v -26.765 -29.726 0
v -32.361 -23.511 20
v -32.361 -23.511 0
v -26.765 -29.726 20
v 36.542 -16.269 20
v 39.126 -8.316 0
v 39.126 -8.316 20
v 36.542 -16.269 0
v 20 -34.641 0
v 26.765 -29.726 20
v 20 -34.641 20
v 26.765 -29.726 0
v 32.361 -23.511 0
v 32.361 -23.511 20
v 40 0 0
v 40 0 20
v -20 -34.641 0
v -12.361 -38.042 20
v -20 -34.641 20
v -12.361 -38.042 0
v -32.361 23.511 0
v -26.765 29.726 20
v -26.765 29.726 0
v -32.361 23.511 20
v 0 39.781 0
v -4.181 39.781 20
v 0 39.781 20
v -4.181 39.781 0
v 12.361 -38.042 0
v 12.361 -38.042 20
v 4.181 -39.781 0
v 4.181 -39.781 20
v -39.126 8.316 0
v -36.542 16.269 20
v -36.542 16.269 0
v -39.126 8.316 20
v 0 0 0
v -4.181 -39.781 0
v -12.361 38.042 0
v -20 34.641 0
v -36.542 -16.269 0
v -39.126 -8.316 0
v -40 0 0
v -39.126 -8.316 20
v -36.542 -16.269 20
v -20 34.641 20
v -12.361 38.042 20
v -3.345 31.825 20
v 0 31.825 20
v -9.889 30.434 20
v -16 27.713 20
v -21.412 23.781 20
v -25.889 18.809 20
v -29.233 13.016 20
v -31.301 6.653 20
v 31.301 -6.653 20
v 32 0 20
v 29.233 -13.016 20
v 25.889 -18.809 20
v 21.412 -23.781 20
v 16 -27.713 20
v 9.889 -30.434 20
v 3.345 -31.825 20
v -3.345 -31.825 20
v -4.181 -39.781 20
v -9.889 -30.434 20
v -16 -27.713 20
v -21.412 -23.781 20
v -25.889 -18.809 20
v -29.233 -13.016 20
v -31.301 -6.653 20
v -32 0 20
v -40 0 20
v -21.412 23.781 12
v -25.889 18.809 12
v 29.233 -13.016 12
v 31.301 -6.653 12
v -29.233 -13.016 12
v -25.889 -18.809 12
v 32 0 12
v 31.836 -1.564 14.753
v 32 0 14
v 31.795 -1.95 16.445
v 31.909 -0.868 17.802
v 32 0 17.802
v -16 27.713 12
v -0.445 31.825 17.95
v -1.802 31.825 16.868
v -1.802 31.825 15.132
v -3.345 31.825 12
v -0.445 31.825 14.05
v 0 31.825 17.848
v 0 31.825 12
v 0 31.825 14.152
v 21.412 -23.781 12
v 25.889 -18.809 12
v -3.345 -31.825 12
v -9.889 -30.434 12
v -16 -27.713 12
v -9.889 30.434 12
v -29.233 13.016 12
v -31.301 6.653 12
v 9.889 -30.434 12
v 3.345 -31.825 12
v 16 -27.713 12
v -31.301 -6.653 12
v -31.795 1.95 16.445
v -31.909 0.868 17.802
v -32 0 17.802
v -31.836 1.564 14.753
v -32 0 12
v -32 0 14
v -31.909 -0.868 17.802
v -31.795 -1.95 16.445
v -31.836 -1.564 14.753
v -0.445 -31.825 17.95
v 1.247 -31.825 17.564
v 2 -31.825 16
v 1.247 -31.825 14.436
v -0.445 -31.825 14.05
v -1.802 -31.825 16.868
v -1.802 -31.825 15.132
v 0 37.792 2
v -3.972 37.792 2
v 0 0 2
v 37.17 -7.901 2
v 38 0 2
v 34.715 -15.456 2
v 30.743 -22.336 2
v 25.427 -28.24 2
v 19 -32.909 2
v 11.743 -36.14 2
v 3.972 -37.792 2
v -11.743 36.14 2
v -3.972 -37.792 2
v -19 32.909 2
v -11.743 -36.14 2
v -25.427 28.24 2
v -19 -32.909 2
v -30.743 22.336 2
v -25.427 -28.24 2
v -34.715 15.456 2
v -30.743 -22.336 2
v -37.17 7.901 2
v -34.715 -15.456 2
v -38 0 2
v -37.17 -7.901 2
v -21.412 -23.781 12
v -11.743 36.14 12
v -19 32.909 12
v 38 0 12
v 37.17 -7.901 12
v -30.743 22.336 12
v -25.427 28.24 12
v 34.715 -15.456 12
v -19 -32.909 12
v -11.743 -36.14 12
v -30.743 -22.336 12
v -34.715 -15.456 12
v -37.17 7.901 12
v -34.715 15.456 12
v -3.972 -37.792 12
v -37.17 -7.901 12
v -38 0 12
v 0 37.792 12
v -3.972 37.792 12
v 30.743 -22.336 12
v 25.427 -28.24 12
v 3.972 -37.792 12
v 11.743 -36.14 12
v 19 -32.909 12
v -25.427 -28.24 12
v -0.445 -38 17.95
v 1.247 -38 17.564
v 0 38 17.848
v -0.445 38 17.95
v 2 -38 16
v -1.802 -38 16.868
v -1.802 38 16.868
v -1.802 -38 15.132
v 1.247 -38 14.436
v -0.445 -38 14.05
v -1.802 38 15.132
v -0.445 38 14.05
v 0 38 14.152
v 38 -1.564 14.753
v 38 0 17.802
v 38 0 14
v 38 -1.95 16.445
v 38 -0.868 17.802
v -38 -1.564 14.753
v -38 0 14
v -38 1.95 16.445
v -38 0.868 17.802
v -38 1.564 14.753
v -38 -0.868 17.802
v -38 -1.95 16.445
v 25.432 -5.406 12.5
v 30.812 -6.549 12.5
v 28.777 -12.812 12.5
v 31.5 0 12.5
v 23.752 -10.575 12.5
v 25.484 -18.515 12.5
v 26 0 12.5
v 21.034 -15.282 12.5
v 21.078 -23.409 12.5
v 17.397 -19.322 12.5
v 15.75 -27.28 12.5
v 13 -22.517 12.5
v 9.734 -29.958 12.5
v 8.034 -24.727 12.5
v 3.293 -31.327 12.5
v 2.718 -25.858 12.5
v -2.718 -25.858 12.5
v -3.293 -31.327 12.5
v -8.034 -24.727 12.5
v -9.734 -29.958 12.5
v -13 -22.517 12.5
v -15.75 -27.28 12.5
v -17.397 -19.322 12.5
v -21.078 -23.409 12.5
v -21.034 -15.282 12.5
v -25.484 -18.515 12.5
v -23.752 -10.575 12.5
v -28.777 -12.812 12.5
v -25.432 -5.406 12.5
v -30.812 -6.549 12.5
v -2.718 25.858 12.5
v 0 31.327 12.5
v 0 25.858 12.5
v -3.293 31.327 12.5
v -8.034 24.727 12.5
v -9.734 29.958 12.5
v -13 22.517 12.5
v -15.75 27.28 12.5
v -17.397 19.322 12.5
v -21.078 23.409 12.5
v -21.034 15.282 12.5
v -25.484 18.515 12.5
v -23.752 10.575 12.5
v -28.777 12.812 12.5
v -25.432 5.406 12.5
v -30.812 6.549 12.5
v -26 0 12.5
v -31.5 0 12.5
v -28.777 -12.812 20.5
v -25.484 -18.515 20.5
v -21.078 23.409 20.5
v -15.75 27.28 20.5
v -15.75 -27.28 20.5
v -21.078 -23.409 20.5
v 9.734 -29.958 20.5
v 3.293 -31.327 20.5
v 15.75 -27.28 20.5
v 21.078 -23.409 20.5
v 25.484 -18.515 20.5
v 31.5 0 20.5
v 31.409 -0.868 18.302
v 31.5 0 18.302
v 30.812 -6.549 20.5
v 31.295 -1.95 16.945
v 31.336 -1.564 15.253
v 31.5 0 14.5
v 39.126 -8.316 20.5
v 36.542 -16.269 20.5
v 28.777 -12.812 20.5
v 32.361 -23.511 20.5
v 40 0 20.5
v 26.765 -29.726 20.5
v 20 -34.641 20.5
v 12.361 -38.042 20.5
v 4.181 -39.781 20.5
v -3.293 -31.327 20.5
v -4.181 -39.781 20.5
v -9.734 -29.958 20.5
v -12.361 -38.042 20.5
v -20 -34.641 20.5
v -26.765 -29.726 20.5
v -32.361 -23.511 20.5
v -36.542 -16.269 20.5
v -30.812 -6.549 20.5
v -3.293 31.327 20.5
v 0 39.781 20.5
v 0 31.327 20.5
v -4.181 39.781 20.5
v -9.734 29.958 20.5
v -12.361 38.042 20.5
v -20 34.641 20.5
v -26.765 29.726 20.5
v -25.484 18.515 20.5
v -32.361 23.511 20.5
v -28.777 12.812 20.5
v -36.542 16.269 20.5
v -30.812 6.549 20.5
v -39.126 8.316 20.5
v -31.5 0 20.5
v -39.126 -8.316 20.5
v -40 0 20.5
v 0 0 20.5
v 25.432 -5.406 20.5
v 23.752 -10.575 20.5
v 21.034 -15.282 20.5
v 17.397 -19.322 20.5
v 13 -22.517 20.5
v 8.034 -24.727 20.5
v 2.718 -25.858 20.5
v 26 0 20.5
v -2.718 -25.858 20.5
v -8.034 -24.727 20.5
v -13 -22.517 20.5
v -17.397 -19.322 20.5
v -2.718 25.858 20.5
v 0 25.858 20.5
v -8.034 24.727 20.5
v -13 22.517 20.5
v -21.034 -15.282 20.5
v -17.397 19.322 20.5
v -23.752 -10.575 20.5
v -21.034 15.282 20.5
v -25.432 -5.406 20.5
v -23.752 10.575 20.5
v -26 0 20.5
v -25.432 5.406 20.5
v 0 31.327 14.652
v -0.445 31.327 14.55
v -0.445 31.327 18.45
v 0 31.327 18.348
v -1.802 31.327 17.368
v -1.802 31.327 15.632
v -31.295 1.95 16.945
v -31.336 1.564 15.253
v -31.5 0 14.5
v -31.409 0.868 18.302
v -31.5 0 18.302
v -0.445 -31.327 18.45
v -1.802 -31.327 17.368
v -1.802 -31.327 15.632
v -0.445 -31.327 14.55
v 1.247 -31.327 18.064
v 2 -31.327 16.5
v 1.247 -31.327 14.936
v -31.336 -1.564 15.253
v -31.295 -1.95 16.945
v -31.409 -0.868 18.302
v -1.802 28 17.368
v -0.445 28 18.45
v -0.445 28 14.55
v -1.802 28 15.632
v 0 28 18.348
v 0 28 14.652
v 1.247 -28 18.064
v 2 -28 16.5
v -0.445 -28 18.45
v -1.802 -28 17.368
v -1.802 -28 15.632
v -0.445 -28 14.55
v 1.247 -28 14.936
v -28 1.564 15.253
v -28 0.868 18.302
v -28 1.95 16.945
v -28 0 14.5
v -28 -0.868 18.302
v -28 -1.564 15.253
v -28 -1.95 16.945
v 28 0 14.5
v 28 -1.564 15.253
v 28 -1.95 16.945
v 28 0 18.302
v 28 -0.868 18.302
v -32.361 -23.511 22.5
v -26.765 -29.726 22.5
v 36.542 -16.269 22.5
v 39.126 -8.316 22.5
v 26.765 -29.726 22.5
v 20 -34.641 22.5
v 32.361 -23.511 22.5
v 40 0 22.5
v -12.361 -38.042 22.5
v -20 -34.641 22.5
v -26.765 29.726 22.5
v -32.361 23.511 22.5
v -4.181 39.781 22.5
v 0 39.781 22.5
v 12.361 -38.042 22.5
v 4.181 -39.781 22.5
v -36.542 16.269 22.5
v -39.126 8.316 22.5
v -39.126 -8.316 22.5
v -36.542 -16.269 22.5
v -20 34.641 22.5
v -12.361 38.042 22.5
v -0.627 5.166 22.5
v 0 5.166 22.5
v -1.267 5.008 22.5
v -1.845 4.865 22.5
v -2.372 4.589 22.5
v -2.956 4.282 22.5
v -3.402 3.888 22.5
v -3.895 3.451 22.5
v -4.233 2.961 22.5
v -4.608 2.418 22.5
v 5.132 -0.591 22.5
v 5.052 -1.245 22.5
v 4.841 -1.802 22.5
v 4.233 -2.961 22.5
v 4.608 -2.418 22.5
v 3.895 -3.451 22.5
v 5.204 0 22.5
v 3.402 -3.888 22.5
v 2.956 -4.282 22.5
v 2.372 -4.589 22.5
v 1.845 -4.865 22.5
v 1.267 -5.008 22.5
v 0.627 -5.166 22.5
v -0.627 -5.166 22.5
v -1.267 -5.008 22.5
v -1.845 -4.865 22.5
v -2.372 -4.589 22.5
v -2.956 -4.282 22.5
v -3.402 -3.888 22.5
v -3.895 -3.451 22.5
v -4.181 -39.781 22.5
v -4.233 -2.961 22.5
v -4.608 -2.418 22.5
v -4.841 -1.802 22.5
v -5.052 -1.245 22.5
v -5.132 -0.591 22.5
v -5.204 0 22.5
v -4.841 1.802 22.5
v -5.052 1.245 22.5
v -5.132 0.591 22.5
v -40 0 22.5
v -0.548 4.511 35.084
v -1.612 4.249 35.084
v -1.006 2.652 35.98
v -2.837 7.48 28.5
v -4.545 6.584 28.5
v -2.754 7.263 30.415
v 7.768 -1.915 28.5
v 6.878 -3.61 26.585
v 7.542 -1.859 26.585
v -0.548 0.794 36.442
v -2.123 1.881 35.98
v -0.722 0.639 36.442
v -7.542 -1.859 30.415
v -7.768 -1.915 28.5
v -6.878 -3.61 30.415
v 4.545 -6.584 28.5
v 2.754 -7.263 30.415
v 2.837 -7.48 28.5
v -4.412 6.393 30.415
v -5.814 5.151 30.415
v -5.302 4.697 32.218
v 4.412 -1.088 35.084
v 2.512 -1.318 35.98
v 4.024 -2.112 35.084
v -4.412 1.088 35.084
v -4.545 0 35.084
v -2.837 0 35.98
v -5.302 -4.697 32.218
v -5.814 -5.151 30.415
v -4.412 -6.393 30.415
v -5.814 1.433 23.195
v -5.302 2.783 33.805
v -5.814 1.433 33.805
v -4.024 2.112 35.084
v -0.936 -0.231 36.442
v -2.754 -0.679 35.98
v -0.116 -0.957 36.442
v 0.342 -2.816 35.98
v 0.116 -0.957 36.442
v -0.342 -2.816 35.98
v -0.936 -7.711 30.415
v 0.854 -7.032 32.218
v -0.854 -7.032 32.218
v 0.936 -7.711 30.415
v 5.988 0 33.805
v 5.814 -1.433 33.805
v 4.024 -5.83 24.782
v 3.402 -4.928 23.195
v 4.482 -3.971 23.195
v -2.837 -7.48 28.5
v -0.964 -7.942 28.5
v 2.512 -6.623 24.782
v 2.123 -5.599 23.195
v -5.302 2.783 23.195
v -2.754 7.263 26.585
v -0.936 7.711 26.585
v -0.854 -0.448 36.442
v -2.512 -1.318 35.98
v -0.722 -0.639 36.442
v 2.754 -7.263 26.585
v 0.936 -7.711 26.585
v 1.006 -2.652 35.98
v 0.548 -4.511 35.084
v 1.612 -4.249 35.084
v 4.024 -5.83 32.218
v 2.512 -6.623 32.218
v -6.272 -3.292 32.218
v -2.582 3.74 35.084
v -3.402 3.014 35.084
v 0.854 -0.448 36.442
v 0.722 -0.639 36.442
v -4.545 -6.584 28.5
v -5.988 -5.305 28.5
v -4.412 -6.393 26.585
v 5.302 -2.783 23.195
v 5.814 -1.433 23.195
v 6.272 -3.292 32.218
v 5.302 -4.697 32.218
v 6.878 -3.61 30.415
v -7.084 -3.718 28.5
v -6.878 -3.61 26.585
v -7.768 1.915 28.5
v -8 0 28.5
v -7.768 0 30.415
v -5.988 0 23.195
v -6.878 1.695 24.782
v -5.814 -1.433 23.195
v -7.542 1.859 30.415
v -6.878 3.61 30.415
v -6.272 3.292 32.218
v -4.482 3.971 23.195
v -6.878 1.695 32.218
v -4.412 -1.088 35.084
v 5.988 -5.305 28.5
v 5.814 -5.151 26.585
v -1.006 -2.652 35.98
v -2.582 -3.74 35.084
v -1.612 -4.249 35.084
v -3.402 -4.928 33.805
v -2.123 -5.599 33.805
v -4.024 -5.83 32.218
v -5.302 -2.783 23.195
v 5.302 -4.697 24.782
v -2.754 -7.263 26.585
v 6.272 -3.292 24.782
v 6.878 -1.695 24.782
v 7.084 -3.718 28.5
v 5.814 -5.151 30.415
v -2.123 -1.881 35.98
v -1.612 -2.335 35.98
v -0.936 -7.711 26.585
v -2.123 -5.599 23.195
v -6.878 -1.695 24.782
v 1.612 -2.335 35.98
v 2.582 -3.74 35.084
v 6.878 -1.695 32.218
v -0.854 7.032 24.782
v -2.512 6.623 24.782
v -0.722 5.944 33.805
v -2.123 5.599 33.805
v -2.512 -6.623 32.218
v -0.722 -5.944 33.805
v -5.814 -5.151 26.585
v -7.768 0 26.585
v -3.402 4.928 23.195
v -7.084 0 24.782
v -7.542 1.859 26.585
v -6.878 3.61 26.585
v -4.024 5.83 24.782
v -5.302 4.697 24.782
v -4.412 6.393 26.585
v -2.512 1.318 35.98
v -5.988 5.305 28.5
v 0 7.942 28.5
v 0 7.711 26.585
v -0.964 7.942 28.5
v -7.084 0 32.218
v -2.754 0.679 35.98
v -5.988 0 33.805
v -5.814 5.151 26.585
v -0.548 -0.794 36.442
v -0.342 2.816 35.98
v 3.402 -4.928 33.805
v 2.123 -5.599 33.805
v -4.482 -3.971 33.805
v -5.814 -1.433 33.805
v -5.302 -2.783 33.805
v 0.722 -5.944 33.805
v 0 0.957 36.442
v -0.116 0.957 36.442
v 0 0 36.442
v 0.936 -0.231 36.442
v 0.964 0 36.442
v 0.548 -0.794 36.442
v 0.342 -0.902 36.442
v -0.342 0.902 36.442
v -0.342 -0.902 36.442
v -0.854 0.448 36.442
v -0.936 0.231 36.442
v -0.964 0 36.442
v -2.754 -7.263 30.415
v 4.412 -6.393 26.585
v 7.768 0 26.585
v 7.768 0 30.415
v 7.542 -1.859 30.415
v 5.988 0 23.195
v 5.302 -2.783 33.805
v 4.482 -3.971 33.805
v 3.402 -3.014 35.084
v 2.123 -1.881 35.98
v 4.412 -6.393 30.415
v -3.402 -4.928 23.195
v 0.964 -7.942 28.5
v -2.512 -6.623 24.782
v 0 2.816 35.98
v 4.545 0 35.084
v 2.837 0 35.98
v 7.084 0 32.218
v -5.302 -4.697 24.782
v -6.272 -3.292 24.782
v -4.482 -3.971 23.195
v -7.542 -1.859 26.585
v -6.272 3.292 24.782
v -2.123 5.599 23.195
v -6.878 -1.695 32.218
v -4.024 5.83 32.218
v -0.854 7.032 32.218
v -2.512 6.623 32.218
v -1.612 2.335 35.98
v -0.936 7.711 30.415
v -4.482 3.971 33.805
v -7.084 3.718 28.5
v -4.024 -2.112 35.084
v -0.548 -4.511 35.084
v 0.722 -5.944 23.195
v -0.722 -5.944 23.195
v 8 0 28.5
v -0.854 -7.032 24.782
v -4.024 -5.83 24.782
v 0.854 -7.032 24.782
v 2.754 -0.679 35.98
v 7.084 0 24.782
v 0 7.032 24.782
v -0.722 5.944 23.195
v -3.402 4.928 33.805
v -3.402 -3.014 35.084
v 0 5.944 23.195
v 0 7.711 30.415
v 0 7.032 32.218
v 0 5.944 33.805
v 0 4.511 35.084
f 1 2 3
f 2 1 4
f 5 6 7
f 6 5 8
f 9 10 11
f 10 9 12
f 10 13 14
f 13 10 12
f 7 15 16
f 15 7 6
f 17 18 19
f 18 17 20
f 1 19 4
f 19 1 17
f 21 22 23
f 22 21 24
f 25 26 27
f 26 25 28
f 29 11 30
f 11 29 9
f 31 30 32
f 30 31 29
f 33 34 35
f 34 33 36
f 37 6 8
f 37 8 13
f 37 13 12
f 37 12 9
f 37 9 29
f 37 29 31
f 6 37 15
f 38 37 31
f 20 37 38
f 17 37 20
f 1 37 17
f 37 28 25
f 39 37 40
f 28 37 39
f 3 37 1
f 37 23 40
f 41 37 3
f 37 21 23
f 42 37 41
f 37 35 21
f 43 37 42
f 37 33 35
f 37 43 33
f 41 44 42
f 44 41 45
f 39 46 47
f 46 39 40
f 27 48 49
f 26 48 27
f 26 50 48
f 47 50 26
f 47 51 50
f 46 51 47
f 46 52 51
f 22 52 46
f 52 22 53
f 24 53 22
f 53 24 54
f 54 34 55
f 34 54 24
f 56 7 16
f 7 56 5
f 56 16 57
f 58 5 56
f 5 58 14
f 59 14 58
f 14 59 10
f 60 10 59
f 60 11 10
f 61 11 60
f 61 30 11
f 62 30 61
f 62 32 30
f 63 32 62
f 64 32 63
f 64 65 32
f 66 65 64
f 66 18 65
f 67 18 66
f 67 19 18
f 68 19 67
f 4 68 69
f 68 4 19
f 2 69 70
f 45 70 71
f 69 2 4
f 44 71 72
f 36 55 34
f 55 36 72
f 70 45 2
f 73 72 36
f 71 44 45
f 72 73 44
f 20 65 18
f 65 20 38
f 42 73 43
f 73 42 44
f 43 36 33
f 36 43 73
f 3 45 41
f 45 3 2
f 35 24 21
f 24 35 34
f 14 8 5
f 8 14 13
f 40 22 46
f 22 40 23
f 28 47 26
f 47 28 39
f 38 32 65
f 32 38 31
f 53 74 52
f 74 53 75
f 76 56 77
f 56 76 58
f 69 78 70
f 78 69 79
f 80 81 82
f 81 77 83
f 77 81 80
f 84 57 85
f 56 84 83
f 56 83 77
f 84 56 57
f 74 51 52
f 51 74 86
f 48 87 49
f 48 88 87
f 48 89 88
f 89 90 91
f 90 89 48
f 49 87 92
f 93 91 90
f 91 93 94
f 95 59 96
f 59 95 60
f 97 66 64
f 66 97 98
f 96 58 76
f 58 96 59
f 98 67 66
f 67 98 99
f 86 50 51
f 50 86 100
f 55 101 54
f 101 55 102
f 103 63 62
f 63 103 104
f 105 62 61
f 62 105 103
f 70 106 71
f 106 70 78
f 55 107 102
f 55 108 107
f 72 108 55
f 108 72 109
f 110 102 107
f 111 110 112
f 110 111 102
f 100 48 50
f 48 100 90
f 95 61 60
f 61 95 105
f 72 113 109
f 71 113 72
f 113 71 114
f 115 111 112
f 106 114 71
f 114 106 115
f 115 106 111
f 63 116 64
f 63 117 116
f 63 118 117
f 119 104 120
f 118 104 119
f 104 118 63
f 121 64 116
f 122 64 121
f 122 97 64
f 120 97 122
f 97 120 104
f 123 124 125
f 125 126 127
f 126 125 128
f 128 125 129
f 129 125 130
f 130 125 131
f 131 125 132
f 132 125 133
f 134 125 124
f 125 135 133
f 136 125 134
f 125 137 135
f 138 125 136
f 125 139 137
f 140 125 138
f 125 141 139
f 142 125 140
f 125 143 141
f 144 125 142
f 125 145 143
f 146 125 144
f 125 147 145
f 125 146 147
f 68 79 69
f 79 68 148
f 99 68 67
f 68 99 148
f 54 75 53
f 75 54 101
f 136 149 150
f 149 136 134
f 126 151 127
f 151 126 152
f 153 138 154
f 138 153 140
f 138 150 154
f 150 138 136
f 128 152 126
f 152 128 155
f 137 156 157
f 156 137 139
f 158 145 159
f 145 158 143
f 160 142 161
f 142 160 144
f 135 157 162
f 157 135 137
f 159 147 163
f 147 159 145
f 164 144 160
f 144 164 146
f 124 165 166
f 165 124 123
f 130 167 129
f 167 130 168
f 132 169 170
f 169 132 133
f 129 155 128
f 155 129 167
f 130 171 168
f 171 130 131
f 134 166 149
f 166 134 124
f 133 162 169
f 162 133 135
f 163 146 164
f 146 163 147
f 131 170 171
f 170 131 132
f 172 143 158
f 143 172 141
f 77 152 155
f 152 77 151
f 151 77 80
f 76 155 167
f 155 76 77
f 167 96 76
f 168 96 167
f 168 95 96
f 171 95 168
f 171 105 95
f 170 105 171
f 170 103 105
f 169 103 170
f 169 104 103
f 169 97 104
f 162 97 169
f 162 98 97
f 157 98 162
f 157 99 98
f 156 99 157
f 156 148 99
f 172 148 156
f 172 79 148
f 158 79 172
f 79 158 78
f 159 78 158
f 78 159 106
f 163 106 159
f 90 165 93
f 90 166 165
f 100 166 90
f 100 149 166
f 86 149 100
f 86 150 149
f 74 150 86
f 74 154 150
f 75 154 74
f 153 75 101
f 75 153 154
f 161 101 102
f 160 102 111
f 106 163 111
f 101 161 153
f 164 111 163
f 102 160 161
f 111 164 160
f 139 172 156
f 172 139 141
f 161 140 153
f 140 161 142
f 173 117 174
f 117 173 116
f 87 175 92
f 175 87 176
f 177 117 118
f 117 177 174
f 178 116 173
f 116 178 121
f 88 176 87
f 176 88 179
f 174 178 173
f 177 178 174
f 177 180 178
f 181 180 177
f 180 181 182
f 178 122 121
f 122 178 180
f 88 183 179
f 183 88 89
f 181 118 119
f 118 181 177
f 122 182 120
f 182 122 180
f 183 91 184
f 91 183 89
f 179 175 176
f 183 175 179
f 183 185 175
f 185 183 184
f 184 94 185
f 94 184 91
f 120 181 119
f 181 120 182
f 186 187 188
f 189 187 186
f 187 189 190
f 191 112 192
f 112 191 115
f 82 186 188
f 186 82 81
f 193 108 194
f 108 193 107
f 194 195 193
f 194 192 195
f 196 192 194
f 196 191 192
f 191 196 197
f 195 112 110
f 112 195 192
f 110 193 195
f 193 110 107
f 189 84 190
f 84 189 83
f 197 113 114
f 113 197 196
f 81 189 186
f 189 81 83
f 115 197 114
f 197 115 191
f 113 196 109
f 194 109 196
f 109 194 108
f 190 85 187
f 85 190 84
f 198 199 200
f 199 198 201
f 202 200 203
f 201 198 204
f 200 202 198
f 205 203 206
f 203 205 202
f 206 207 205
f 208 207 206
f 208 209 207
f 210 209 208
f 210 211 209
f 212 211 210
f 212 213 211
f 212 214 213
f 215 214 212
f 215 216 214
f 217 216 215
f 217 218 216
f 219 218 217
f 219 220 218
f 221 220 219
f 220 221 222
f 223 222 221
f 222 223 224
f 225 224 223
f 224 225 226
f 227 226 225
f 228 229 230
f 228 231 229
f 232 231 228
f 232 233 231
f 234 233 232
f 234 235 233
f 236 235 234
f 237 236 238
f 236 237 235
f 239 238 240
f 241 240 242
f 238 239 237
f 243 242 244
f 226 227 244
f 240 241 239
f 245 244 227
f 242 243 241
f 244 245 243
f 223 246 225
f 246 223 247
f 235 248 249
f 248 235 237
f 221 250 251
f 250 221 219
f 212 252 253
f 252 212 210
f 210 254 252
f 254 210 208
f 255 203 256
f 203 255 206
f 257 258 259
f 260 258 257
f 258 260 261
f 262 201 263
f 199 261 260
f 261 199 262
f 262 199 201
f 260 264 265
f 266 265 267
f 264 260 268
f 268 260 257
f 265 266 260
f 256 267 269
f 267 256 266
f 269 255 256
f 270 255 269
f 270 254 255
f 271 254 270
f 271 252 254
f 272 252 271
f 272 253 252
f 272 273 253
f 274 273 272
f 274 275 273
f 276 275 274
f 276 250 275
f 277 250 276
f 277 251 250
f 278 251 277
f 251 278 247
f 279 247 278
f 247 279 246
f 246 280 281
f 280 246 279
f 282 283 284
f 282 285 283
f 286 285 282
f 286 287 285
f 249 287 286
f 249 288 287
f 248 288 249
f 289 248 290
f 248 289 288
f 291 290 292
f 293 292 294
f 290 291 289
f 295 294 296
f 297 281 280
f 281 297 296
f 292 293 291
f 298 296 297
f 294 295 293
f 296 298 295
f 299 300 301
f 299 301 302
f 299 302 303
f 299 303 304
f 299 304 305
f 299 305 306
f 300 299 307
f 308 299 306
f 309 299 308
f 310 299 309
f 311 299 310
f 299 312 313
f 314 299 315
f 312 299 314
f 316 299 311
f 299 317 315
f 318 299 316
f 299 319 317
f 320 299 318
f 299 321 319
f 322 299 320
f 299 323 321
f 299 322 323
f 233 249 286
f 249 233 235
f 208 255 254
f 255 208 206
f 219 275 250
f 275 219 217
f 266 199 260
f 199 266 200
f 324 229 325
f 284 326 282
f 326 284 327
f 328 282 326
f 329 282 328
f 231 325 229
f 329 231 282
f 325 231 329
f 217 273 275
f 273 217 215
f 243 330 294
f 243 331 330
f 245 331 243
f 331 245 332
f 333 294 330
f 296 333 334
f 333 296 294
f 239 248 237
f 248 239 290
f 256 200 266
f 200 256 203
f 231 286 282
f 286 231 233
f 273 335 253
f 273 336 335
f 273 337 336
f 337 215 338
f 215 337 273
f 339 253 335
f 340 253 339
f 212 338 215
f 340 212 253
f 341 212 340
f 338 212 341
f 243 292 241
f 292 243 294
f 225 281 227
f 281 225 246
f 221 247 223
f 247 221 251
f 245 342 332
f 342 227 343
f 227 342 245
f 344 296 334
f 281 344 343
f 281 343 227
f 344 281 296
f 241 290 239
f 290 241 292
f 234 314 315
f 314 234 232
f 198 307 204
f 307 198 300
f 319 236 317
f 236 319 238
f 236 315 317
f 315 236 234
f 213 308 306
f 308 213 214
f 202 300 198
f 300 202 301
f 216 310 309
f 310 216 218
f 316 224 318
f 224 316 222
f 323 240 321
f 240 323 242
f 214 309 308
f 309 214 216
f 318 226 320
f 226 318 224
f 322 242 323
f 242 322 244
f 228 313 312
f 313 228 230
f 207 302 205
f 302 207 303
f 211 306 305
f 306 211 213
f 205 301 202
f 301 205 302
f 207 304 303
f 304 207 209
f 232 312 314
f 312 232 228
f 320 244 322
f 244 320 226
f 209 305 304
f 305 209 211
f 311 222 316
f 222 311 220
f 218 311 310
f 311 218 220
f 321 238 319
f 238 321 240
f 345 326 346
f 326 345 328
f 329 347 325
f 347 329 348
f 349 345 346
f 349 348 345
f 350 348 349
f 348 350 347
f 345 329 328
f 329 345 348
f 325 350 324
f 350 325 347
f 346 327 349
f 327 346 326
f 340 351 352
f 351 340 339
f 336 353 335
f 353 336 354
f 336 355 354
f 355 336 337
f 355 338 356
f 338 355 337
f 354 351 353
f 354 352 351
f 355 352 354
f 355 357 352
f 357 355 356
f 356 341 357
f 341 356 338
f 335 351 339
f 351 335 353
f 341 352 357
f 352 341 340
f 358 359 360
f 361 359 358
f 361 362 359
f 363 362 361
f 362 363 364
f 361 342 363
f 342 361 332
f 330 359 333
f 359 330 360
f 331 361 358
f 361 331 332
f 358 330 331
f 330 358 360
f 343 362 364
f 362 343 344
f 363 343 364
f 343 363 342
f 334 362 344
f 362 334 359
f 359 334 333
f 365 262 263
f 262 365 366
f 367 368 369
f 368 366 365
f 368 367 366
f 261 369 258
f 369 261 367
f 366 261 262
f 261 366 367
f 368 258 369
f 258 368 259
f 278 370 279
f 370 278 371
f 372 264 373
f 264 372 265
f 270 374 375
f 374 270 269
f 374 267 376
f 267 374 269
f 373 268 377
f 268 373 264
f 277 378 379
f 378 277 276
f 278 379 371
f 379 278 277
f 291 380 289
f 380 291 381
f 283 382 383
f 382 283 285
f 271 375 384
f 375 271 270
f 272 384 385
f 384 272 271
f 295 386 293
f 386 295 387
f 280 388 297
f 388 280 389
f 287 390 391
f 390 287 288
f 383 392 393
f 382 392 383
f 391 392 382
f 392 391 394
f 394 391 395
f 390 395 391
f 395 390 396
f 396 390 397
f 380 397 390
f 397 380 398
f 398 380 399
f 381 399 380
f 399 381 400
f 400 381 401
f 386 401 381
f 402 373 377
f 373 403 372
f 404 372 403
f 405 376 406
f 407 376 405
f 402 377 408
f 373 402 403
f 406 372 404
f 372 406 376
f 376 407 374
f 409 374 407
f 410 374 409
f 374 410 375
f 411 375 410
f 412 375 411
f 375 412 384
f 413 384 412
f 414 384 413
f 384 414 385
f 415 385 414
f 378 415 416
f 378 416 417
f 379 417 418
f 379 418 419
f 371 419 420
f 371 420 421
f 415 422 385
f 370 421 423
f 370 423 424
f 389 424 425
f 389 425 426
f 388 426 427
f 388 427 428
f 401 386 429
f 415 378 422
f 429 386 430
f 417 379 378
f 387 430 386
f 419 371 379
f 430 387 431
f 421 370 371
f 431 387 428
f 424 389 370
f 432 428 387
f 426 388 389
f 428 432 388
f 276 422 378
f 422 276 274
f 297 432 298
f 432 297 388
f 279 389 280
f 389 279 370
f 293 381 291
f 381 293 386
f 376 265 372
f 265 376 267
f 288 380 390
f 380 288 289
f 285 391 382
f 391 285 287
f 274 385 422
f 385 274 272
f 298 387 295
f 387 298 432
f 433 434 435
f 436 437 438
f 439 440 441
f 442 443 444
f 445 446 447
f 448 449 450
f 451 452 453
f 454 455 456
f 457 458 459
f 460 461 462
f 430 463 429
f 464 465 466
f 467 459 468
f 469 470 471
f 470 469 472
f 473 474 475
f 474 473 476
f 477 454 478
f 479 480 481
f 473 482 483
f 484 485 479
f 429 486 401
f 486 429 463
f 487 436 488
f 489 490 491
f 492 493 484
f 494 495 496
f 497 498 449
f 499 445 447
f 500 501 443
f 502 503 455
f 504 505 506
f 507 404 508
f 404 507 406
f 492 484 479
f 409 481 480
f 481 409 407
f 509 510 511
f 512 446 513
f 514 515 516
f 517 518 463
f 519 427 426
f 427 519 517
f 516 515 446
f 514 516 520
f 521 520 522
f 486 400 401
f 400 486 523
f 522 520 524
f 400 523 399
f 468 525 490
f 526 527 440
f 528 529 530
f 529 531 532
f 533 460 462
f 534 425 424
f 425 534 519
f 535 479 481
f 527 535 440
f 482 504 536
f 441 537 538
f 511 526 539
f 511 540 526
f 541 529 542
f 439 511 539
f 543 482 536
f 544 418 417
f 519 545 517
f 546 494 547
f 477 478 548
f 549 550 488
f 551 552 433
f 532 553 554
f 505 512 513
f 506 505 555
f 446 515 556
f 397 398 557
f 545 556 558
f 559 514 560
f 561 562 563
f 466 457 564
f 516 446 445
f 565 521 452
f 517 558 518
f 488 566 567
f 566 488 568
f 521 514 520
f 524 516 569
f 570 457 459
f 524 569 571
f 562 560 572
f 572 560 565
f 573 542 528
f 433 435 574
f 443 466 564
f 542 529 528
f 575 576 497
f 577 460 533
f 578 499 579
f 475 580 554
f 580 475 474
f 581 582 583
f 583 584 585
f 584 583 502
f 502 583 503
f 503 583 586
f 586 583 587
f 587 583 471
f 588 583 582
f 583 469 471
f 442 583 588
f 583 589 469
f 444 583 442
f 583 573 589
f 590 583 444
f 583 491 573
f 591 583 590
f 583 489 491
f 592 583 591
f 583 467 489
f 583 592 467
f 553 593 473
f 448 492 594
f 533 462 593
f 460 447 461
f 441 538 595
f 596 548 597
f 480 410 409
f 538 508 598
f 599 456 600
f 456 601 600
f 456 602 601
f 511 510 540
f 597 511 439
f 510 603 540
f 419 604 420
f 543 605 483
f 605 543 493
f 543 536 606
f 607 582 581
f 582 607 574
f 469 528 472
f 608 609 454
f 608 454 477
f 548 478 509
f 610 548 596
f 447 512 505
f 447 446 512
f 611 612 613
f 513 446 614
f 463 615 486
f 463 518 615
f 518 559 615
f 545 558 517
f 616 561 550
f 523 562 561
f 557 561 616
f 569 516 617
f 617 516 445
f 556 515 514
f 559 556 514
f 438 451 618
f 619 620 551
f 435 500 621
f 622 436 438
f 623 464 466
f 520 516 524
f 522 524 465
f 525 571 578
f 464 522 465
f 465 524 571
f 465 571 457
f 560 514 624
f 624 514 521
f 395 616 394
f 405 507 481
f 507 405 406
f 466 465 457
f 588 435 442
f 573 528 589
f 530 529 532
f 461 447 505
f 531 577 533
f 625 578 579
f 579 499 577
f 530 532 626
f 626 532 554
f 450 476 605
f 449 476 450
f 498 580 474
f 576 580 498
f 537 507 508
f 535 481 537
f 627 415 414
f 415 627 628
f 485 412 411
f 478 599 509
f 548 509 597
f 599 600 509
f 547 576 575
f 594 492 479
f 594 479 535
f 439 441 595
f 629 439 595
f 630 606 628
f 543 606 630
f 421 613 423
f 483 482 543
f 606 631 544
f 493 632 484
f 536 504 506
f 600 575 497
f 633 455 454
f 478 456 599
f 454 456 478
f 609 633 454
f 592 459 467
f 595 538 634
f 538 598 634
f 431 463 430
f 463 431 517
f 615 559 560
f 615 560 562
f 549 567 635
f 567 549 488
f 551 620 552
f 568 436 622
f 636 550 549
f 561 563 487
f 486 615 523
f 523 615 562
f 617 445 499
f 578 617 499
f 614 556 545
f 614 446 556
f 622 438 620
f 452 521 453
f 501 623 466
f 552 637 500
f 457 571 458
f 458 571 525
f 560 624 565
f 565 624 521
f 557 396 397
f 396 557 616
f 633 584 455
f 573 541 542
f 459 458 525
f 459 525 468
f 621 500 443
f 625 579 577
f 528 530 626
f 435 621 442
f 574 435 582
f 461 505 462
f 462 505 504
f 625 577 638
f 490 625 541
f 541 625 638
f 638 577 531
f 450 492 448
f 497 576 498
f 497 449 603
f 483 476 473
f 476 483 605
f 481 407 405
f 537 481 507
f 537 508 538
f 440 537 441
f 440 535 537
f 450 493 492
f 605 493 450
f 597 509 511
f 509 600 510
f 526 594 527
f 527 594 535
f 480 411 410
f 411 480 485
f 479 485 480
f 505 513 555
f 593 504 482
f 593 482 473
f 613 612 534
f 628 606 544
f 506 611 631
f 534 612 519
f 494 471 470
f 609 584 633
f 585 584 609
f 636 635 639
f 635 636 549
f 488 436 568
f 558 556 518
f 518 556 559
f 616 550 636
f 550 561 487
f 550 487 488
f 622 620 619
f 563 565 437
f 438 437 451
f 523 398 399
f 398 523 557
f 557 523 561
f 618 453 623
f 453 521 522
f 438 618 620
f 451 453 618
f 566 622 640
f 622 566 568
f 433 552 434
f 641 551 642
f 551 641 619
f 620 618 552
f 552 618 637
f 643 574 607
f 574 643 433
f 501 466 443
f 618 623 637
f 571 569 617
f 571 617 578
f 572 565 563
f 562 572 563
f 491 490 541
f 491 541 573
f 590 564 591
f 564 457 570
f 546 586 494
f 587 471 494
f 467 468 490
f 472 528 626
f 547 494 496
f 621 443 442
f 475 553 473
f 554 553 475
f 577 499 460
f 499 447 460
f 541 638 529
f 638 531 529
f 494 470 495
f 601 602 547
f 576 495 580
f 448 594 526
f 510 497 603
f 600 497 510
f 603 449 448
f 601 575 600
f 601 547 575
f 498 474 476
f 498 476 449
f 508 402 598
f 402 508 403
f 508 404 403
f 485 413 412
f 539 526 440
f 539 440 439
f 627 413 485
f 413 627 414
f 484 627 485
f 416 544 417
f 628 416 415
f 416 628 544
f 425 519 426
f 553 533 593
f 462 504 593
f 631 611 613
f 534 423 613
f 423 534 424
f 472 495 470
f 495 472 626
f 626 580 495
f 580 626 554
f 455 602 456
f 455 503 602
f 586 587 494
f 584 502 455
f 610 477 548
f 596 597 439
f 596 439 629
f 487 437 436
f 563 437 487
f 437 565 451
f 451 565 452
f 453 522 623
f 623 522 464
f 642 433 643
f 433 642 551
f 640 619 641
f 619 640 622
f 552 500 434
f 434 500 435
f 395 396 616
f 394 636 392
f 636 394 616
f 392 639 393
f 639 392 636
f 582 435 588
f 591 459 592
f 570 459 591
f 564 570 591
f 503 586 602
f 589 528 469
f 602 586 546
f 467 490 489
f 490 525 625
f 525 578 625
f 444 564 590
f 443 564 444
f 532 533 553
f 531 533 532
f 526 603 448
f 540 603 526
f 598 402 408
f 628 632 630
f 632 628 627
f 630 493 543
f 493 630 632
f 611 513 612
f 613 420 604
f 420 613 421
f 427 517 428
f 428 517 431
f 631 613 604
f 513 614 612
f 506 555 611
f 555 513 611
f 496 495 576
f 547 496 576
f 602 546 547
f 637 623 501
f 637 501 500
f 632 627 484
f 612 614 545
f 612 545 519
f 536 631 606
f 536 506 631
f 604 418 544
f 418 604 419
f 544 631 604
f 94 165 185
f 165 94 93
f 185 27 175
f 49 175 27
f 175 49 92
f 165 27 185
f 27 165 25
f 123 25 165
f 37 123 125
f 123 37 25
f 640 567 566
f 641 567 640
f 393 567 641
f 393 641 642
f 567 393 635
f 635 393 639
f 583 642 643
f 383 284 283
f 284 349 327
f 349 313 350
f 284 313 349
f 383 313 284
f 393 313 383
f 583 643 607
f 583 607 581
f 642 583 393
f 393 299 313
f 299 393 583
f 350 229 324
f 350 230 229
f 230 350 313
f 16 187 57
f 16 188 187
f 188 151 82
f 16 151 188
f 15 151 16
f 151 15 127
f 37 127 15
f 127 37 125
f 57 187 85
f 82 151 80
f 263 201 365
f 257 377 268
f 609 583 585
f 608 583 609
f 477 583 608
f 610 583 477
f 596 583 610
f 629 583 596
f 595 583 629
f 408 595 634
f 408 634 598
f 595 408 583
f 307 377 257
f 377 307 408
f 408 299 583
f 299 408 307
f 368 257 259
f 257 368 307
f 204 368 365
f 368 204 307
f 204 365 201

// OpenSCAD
// file: lid.scad
// Centrifugal Puzzle Box - Lid Model

module cpbLid(radius, thickness, clearance){
    difference(){
        cylinder(h=4*thickness, r=radius-4*thickness-clearance);
        cylinder(h=4*thickness, r=radius-7*thickness);
        translate([0,radius-4*thickness,2*thickness]) 
            rotate([90,0,0]) 
                cylinder(h=4*thickness, r=thickness, center=true);
        translate([0,-radius+4*thickness,2*thickness]) 
            rotate([90,0,0]) 
                cylinder(h=4*thickness, r=thickness, center=true);
        translate([-radius+4*thickness,0,2*thickness]) 
            rotate([0,90,0]) 
                cylinder(h=4*thickness, r=thickness, center=true);
        translate([radius-4*thickness,0,2*thickness]) 
            rotate([0,90,0]) 
                cylinder(h=4*thickness, r=thickness, center=true);
    }
    translate([0,0,4*thickness]) 
        cylinder(h=thickness, r=radius);
    translate([0,0,8*thickness]) 
        sphere(r=4*thickness);
}




// Main Model
radius = 40;
width = 20;
thickness = 2;

clearance = 0.5;

cpbLid(radius, thickness, clearance);
// file: base.scad
// Centrifugal Puzzle Box - Base Model

module cpbBase(radius, width, thickness, clearance){
    difference(){
        // Main Body
        cylinder(h=width, r=radius);
        // Entrance Hole
        translate([0,0,thickness]) 
            cylinder(h=width, r=radius-4*thickness);
        // Container Hole
        translate([0,0,thickness]) 
            cylinder(h=width-5*thickness, r=radius-thickness);
        // Pin Holes
        translate([0,0,width - 2*thickness]) 
            rotate([90,0,0])
                cylinder(h=2*radius-2*thickness, r=thickness, center=true);
        translate([0,0,width - 2*thickness]) 
            rotate([0,90,0])
                cylinder(h=2*radius-2*thickness, r=thickness, center=true);
    }
}




// Main Model
radius = 40;
width = 20;
thickness = 2;

clearance = 0.5;

cpbBase(radius, width, thickness, clearance);
// main file
// Centrifugal Puzzle Box - Assembly Model


// Parts
use <base.scad>
use <lid.scad>


// Main Model
radius = 40;
width = 20;
thickness = 2;

clearance = 0.5;
difference(){
    union(){
        cpbBase(radius, width, thickness, clearance);
        translate([0,0,width-4*thickness+clearance])
            cpbLid(radius, thickness, clearance);
    };
    cube(radius);
}
